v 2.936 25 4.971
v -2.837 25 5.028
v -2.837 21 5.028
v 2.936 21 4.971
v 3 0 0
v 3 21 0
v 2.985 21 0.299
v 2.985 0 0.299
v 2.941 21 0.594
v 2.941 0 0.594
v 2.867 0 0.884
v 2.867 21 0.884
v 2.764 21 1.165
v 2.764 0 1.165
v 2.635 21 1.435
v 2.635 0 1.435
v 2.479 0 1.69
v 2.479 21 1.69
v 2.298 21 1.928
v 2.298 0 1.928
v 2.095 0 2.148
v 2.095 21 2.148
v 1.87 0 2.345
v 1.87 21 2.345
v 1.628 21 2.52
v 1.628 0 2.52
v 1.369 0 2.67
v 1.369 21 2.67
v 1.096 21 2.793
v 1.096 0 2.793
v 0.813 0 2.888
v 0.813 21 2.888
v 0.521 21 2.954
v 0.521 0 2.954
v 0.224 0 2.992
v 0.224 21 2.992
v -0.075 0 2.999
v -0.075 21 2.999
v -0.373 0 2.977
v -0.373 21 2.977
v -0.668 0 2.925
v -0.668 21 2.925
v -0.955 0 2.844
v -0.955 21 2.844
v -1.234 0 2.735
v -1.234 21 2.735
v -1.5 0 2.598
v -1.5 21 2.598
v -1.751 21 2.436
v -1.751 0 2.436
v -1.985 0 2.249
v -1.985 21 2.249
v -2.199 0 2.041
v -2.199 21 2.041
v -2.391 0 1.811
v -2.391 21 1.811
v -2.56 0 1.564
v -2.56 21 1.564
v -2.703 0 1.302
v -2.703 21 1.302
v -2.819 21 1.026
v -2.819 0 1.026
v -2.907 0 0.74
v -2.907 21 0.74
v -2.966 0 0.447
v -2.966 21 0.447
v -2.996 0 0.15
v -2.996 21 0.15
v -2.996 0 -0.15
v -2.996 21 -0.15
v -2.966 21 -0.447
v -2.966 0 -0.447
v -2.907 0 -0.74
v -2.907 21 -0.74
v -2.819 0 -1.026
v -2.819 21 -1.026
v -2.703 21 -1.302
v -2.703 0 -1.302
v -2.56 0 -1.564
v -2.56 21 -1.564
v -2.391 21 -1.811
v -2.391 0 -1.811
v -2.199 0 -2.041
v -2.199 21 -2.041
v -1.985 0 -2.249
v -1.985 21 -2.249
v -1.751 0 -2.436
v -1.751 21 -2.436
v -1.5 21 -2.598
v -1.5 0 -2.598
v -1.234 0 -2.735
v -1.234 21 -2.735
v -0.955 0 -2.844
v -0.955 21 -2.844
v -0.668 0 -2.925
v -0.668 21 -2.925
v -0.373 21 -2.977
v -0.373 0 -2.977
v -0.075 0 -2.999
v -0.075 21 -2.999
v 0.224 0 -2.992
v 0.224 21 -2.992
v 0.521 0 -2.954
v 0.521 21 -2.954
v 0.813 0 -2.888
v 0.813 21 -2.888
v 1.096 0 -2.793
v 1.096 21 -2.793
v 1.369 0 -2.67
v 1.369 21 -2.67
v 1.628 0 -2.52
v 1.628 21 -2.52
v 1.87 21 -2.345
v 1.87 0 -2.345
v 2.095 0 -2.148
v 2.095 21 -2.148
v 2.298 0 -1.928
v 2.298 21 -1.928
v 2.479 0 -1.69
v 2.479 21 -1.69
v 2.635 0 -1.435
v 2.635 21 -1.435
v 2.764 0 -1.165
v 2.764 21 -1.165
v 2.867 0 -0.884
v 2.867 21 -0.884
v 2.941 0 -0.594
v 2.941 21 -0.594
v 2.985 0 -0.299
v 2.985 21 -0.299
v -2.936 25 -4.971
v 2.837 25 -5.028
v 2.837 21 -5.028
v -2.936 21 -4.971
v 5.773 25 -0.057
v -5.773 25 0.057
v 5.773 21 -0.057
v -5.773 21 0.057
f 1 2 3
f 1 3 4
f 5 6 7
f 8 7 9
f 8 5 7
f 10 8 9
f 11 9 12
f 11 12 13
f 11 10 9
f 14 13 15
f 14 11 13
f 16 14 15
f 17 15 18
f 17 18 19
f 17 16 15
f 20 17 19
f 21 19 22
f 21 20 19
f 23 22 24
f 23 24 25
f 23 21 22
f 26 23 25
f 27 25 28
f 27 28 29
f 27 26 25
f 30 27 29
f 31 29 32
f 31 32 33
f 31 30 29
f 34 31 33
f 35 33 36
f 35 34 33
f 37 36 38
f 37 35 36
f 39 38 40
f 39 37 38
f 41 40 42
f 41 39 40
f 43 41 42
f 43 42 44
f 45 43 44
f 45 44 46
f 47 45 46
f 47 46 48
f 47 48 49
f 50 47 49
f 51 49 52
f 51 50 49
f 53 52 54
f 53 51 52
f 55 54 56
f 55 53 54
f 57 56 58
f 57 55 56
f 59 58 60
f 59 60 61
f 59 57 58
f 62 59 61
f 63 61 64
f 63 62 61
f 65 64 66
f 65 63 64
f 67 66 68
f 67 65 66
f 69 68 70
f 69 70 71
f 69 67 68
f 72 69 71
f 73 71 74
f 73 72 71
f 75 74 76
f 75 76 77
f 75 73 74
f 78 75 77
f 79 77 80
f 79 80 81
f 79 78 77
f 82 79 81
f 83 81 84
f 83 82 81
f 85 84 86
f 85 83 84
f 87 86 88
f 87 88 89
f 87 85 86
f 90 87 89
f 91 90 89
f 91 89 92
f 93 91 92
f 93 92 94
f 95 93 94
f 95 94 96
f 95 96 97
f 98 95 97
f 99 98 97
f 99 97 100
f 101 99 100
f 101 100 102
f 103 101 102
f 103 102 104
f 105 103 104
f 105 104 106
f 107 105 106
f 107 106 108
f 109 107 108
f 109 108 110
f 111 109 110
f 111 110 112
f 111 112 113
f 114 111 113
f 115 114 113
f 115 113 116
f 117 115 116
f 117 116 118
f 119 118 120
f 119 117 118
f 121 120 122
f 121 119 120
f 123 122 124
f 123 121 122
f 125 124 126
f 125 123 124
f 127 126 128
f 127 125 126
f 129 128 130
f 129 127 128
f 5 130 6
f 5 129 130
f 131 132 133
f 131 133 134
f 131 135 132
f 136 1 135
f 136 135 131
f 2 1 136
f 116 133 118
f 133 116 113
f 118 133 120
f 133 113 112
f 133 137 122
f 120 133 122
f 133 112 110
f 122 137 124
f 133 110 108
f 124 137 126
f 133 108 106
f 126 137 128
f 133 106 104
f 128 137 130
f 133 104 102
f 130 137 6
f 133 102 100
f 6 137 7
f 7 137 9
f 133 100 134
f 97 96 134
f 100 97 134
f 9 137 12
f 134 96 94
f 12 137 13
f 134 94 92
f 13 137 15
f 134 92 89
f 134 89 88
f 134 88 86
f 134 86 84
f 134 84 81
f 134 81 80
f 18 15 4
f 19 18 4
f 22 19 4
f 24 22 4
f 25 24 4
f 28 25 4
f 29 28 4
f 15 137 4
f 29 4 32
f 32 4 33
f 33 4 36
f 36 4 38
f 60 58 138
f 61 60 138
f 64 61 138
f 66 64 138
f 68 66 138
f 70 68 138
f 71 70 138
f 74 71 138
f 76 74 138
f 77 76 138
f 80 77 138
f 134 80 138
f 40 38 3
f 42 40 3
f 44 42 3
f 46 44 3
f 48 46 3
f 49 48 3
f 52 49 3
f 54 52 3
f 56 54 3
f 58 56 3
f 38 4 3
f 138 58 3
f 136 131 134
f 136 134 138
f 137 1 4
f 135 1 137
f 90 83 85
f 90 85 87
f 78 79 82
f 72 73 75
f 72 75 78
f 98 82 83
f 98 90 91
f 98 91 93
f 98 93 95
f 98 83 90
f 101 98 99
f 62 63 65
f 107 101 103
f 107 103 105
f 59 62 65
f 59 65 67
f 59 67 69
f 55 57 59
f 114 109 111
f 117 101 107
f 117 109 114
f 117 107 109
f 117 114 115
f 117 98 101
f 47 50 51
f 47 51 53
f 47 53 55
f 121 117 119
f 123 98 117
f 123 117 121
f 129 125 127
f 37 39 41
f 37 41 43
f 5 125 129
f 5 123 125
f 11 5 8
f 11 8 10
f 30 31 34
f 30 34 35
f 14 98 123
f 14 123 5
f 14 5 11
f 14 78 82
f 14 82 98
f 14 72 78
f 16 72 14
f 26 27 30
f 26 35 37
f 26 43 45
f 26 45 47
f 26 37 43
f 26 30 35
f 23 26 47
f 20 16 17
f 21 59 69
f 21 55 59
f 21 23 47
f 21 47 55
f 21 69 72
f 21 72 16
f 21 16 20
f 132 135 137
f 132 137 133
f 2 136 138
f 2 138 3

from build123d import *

# Parameters (mm, degrees)
F0_R     = 5
F1_DEPTH = 25
F2_R     = 5
F2_R_2   = 3
F3_DEPTH = 21
F5_DEPTH = 4


with BuildPart() as f1:
    # F0 (on Front) → F1 (new body)
    with BuildSketch(Plane.XZ):
        Circle(F0_R)
    extrude(amount=-F1_DEPTH)

    # F2 (on face) → F3 (cut)
    with BuildSketch(Plane.XZ):
        Circle(F2_R)
        Circle(F2_R_2, mode=Mode.SUBTRACT)
    extrude(amount=-F3_DEPTH, mode=Mode.SUBTRACT)

    # F4 (on face) → F5 (join)
    with BuildSketch(Plane(origin=(0, 25, 0), x_dir=(-1, 0, 0), z_dir=(0, 1, 0))):
        Polygon((2.936192, -4.971128), (5.773219, 0.057253), (2.837027, 5.028381), (-2.936192, 4.971128), (-5.773219, -0.057253), (-2.837027, -5.028381), align=None)
    extrude(amount=-F5_DEPTH)


solid = f1.part
